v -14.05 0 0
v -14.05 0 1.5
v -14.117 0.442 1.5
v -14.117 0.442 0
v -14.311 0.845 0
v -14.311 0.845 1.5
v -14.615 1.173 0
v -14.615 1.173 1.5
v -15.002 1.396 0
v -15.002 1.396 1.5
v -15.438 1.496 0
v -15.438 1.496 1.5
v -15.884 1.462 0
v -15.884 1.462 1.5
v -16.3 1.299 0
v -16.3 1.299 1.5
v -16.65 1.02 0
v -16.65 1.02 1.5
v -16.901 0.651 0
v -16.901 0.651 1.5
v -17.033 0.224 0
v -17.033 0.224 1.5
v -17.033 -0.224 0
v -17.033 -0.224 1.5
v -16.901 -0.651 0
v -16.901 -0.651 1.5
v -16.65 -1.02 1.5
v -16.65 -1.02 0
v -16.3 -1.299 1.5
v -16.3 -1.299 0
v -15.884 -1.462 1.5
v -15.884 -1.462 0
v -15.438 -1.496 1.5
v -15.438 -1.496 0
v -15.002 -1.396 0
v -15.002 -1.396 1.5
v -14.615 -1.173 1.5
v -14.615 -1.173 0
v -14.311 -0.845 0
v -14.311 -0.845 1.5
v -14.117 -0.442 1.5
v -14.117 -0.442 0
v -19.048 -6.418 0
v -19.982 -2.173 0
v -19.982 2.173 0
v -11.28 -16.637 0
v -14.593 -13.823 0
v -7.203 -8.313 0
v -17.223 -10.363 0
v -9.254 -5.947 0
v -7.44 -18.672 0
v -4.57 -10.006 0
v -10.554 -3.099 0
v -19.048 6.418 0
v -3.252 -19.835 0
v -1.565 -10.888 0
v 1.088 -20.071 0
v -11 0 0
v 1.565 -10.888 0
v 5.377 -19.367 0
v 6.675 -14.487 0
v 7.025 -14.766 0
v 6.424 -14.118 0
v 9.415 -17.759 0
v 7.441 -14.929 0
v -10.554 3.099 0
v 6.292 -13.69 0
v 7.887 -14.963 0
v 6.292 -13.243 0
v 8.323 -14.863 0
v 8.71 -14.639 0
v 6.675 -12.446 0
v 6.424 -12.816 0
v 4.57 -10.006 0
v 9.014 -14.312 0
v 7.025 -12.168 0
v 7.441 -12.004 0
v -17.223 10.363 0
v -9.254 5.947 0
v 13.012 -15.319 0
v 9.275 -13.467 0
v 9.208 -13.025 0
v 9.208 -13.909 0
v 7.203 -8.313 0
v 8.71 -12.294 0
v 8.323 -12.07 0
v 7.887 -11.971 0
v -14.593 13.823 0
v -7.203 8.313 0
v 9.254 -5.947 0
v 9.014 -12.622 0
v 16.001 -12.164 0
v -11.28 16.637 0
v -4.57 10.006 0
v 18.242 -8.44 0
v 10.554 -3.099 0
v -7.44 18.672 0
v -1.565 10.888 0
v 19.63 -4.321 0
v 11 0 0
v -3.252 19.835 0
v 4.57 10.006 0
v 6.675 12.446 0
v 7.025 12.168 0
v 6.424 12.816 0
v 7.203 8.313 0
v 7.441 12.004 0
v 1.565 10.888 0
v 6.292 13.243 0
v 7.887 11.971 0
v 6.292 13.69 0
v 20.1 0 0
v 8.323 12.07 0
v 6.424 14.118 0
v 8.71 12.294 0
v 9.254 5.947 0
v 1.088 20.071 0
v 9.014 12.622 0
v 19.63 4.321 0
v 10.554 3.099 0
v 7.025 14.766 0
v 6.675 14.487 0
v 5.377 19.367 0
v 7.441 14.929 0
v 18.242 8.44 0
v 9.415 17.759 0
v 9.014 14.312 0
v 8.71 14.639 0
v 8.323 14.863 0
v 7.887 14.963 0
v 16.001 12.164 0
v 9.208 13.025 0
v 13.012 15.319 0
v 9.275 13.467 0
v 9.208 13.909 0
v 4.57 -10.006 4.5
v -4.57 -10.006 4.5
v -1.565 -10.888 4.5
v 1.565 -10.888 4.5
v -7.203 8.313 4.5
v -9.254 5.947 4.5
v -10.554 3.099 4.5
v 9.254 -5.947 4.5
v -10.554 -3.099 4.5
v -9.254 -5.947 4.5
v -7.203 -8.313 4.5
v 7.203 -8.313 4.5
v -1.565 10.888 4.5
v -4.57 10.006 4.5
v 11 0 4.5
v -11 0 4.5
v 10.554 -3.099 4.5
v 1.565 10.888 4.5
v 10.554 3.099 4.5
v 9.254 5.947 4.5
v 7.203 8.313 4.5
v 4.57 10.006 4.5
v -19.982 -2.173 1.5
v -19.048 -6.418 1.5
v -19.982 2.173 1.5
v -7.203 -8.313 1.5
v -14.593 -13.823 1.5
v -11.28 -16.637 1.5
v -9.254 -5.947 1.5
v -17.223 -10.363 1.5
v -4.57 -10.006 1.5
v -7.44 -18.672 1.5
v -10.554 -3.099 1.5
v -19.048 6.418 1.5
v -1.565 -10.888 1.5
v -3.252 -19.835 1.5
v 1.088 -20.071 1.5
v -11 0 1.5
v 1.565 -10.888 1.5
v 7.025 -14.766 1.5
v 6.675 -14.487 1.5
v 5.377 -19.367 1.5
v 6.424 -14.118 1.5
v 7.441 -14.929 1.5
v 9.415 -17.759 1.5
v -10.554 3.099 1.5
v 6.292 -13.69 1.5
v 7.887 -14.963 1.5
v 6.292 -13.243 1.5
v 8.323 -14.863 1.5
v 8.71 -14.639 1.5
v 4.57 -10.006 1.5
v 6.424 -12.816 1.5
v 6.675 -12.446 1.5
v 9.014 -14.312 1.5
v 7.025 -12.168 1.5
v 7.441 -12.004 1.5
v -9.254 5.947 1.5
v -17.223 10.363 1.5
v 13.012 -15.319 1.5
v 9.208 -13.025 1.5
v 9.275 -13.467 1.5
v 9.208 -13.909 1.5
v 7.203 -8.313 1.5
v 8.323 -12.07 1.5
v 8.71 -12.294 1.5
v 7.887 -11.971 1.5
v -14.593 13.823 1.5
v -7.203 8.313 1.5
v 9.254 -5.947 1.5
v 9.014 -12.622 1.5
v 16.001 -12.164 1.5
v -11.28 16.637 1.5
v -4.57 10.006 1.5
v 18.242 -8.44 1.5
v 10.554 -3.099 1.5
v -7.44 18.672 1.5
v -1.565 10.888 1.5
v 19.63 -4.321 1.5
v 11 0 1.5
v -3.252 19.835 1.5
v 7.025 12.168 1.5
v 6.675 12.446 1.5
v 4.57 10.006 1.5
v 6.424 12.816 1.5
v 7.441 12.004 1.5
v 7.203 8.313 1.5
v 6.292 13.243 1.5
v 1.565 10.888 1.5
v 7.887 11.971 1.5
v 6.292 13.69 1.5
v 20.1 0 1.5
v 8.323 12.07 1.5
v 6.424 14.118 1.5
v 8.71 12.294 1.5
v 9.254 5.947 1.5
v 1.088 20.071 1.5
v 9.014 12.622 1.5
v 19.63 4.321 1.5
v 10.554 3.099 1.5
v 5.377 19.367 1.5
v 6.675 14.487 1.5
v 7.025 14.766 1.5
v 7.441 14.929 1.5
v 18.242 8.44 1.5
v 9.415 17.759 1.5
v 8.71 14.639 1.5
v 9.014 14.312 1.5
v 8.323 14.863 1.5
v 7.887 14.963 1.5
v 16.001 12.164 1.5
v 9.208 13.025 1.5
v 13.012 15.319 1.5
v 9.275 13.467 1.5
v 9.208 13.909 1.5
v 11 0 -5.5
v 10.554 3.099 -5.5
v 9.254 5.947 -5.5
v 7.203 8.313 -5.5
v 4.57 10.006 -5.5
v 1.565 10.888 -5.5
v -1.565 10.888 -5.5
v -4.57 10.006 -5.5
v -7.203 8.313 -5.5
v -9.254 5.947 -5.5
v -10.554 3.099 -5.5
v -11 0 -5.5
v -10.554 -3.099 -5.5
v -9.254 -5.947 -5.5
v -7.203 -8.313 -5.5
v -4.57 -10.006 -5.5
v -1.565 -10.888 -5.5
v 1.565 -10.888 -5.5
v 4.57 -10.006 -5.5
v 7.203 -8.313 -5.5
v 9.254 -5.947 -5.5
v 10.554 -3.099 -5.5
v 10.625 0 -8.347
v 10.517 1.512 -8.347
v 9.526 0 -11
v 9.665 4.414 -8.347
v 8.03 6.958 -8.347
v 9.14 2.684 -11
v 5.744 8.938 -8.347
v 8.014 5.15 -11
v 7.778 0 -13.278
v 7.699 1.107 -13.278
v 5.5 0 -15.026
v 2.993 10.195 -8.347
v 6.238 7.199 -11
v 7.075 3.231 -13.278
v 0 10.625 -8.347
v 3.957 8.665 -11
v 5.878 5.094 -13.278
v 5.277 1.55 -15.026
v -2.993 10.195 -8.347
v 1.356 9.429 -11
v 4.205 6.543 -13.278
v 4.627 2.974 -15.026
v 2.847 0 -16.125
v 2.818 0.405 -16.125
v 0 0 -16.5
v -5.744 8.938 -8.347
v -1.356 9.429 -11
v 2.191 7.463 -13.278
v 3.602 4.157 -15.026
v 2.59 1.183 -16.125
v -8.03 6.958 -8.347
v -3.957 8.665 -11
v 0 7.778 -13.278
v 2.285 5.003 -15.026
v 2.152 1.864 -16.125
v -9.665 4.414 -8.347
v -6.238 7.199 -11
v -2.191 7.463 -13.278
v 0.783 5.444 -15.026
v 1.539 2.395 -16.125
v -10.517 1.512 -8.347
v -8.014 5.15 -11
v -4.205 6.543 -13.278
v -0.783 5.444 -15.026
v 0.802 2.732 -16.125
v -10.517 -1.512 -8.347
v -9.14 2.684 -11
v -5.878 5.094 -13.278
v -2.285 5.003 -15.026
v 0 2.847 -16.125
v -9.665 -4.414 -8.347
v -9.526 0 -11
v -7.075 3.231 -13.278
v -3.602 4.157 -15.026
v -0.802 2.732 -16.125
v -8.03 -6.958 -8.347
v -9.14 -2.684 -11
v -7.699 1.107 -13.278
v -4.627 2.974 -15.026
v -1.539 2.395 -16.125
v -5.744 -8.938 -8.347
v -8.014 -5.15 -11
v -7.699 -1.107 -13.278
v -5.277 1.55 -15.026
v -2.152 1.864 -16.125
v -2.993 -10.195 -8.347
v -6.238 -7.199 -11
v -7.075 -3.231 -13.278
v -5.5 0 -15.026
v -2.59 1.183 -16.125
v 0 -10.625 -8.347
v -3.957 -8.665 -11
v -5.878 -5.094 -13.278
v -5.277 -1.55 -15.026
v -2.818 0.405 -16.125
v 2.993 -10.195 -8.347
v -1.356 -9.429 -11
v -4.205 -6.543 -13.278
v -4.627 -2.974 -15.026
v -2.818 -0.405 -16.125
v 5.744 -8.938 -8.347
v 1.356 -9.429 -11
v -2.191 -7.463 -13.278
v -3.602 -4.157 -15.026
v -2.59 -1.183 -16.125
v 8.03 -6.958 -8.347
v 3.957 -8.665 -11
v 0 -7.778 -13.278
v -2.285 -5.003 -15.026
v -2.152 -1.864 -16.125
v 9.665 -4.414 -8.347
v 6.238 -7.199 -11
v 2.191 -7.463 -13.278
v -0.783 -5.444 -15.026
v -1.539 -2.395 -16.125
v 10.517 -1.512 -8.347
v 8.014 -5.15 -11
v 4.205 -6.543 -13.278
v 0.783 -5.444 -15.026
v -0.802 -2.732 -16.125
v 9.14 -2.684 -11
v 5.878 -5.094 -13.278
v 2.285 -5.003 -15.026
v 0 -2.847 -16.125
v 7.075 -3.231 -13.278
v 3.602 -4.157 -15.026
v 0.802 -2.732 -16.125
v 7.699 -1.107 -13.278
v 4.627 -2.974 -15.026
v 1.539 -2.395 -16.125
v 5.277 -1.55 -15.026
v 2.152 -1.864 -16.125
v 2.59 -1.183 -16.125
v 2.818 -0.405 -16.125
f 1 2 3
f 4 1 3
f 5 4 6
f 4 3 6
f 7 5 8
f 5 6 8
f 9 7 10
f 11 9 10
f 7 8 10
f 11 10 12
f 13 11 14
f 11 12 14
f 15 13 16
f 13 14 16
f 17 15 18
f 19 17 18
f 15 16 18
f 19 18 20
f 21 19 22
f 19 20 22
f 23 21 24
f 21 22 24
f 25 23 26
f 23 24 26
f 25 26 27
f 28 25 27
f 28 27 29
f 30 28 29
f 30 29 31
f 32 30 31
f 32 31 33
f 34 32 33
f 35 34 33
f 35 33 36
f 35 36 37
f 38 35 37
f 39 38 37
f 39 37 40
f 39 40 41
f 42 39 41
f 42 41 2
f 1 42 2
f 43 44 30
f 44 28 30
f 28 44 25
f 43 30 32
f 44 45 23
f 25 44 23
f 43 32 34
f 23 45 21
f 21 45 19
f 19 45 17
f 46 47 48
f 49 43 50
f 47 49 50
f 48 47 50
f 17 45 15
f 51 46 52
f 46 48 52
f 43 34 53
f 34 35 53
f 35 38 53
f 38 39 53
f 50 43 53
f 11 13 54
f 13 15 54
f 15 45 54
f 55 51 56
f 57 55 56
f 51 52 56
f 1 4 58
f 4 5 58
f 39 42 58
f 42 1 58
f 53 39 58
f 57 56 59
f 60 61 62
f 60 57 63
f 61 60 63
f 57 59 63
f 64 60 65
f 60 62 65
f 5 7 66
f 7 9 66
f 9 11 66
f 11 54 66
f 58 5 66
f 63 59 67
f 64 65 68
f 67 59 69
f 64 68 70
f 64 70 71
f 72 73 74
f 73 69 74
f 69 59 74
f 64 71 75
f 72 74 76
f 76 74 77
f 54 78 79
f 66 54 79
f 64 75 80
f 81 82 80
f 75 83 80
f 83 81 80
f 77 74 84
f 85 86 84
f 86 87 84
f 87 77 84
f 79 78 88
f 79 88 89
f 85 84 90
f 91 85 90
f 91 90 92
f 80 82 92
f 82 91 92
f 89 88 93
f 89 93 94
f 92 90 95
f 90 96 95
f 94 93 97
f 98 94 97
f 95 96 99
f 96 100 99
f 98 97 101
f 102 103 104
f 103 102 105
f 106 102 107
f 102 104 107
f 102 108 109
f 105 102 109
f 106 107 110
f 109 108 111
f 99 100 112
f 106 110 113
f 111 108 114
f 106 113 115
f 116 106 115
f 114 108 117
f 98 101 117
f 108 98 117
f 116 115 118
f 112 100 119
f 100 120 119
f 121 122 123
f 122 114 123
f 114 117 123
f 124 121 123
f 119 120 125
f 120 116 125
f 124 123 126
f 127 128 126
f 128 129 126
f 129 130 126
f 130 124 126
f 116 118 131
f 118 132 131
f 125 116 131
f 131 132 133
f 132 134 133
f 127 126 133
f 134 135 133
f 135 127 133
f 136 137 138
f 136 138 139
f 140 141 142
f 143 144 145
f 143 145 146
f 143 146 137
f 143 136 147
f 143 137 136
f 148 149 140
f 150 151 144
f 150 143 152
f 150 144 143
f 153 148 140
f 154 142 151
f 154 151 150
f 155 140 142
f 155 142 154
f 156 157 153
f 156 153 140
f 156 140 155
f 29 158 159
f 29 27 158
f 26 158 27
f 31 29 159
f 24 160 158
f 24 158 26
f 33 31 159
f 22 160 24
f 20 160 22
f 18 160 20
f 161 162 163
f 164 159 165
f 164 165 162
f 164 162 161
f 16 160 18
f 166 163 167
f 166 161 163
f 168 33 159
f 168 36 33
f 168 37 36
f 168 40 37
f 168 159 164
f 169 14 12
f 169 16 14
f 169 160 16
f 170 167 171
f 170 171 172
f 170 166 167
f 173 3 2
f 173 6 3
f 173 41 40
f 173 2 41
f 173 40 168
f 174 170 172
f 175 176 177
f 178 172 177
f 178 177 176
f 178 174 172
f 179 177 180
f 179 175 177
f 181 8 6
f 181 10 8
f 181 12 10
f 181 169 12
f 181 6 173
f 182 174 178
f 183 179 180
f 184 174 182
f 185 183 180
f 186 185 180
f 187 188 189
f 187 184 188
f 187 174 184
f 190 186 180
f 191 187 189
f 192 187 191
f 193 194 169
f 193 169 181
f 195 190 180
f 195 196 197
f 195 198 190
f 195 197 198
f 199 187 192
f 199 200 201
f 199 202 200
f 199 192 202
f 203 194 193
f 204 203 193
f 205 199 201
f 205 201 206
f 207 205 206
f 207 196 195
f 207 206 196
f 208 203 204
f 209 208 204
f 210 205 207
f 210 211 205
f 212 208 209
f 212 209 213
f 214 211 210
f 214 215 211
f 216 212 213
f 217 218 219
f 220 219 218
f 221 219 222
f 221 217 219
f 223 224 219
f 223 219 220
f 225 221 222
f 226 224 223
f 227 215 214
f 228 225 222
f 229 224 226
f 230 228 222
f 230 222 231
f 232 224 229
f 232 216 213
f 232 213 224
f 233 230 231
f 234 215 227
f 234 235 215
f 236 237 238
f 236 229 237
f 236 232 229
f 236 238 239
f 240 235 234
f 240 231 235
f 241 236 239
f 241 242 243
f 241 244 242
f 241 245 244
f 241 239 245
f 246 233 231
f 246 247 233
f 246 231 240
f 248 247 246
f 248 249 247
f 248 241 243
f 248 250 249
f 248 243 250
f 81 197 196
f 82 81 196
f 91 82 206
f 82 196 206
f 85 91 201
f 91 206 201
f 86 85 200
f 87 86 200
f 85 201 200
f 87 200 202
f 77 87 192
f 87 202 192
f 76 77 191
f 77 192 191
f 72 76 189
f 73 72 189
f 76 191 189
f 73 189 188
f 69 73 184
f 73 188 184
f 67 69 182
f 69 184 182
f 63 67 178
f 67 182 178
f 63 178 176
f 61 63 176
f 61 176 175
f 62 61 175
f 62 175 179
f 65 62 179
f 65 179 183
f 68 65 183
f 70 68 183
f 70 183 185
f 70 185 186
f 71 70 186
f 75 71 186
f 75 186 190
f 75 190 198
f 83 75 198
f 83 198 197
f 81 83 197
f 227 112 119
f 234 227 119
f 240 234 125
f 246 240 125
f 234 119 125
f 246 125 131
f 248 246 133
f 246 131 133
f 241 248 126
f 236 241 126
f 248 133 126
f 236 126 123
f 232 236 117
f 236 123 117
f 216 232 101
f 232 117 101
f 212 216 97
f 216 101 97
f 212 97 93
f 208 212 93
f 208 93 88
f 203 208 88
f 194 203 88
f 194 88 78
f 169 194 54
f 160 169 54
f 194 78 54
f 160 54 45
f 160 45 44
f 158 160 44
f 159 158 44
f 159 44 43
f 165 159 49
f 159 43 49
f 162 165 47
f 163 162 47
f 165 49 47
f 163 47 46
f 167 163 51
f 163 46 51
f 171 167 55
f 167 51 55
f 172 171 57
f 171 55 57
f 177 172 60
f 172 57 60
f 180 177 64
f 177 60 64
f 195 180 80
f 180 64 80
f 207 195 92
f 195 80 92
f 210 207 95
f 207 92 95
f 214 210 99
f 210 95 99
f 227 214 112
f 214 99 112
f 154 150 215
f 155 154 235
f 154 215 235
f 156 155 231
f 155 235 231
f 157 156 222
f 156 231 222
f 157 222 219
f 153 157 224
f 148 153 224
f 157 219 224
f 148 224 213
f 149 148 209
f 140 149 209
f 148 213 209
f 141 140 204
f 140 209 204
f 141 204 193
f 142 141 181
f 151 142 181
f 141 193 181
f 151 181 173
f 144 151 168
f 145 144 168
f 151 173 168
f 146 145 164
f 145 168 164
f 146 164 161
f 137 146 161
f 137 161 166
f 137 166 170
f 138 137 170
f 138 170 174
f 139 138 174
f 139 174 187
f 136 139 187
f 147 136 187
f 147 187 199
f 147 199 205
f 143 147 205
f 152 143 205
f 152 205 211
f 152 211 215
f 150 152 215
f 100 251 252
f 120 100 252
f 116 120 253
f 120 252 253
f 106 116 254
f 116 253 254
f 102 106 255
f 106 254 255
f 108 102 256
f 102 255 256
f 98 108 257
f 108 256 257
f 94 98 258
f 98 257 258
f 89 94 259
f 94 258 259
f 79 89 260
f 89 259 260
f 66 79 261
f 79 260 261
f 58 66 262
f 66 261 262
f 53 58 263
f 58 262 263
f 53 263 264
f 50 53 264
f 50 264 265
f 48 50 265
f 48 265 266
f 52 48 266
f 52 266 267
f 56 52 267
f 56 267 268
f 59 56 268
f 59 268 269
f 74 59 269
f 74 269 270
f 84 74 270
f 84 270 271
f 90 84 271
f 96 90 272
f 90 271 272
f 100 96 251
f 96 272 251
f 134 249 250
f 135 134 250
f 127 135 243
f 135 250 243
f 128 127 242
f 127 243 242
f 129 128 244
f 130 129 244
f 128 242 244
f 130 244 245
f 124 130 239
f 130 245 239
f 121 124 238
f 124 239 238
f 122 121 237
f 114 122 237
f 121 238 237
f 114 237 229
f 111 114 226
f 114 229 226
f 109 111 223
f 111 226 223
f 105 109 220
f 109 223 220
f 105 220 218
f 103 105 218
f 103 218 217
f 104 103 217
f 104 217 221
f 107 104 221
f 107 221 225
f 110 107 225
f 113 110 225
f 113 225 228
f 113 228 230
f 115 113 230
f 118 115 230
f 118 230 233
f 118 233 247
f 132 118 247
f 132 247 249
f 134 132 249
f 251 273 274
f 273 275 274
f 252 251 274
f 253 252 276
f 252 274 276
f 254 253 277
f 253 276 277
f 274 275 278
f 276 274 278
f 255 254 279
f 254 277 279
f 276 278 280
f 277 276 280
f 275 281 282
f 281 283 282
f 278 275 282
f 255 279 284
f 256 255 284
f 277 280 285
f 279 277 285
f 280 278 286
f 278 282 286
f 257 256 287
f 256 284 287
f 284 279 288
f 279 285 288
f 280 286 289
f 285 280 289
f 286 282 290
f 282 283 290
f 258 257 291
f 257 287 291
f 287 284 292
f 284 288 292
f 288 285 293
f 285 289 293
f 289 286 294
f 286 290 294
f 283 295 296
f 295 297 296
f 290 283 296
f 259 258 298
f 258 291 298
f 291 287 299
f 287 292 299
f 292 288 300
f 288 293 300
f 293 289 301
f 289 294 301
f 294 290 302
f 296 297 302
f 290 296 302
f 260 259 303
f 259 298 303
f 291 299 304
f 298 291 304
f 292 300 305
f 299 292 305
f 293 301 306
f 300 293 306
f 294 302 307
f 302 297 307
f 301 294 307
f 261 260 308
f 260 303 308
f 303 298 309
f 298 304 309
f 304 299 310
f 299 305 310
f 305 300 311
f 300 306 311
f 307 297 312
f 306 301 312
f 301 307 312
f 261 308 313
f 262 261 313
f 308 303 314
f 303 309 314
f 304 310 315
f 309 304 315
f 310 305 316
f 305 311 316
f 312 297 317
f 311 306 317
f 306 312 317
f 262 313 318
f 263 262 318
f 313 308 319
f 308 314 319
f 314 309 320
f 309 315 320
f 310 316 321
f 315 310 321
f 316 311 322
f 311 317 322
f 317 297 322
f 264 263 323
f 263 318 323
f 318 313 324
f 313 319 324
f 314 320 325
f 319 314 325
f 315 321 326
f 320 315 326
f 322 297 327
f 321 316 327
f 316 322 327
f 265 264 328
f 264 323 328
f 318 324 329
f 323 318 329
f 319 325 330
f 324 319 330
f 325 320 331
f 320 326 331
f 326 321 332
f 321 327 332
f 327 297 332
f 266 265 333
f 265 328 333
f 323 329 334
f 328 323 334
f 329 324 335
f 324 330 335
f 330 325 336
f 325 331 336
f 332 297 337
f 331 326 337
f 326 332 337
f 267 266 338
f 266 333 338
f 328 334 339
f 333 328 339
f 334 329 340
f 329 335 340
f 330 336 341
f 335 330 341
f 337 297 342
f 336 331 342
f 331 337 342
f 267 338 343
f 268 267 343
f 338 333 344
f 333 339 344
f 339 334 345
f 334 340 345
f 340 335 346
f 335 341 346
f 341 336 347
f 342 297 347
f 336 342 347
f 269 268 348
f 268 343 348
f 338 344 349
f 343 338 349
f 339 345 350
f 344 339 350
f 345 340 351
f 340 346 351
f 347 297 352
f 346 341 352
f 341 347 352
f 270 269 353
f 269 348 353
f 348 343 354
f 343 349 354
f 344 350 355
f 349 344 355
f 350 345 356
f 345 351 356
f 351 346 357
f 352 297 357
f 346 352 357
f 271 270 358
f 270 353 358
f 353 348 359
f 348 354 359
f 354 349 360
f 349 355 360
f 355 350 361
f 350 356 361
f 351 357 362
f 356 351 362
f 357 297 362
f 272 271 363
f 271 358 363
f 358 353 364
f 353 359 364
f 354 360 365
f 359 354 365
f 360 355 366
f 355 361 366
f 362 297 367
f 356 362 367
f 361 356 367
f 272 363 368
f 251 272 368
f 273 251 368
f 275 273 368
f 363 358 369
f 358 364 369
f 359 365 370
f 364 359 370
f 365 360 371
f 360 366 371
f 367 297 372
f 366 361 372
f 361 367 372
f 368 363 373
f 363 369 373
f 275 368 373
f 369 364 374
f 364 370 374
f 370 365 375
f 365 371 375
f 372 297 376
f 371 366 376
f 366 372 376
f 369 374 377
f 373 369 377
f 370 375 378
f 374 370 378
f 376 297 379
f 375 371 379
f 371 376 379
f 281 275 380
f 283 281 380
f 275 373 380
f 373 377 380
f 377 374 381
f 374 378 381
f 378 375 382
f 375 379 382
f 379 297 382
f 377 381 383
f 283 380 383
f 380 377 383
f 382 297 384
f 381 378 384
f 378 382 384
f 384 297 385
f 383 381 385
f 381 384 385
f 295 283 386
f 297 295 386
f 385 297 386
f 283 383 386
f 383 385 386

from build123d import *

# Parameters (mm, degrees)
SKETCH2_R                = 20.1
BOSS_EXTRUDE1_DEPTH      = 1.5
BOSS_EXTRUDE2_DEPTH      = 3
BOSS_EXTRUDE2_DEPTH_BACK = 18
SKETCH3_R                = 11
SKETCH4_R                = 1.5
CUT_EXTRUDE1_DEPTH       = 34.6455049
FILLET2_R                = 11


with BuildPart() as part:
    # Sketch2 → Boss-Extrude1 (new body)
    with BuildSketch(Plane.XY):
        Circle(SKETCH2_R)
    extrude(amount=BOSS_EXTRUDE1_DEPTH)

    # Sketch3 → Boss-Extrude2 (add, two sides: drawn at the far end of the back side and taken through both)
    with BuildSketch(Plane.XY.offset(1.5).offset(-BOSS_EXTRUDE2_DEPTH_BACK)):
        Circle(SKETCH3_R)
    extrude(amount=BOSS_EXTRUDE2_DEPTH + BOSS_EXTRUDE2_DEPTH_BACK)

    # Sketch4 → Cut-Extrude1 (cut, through all)
    with BuildSketch(Plane.XY.offset(1.5)):
        with Locations((-15.55, 0)):
            Circle(SKETCH4_R)
        with Locations((7.775, 13.466695029)):
            Circle(SKETCH4_R)
        with Locations((7.775, -13.466695029)):
            Circle(SKETCH4_R)
    extrude(amount=-CUT_EXTRUDE1_DEPTH, mode=Mode.SUBTRACT)

    # Fillet2
    fillet2_edges = [part.edges().sort_by_distance(p)[0] for p in [
        (-11, 0, -16.5),
    ]]
    fillet(fillet2_edges, radius=FILLET2_R)


solid = part.part
